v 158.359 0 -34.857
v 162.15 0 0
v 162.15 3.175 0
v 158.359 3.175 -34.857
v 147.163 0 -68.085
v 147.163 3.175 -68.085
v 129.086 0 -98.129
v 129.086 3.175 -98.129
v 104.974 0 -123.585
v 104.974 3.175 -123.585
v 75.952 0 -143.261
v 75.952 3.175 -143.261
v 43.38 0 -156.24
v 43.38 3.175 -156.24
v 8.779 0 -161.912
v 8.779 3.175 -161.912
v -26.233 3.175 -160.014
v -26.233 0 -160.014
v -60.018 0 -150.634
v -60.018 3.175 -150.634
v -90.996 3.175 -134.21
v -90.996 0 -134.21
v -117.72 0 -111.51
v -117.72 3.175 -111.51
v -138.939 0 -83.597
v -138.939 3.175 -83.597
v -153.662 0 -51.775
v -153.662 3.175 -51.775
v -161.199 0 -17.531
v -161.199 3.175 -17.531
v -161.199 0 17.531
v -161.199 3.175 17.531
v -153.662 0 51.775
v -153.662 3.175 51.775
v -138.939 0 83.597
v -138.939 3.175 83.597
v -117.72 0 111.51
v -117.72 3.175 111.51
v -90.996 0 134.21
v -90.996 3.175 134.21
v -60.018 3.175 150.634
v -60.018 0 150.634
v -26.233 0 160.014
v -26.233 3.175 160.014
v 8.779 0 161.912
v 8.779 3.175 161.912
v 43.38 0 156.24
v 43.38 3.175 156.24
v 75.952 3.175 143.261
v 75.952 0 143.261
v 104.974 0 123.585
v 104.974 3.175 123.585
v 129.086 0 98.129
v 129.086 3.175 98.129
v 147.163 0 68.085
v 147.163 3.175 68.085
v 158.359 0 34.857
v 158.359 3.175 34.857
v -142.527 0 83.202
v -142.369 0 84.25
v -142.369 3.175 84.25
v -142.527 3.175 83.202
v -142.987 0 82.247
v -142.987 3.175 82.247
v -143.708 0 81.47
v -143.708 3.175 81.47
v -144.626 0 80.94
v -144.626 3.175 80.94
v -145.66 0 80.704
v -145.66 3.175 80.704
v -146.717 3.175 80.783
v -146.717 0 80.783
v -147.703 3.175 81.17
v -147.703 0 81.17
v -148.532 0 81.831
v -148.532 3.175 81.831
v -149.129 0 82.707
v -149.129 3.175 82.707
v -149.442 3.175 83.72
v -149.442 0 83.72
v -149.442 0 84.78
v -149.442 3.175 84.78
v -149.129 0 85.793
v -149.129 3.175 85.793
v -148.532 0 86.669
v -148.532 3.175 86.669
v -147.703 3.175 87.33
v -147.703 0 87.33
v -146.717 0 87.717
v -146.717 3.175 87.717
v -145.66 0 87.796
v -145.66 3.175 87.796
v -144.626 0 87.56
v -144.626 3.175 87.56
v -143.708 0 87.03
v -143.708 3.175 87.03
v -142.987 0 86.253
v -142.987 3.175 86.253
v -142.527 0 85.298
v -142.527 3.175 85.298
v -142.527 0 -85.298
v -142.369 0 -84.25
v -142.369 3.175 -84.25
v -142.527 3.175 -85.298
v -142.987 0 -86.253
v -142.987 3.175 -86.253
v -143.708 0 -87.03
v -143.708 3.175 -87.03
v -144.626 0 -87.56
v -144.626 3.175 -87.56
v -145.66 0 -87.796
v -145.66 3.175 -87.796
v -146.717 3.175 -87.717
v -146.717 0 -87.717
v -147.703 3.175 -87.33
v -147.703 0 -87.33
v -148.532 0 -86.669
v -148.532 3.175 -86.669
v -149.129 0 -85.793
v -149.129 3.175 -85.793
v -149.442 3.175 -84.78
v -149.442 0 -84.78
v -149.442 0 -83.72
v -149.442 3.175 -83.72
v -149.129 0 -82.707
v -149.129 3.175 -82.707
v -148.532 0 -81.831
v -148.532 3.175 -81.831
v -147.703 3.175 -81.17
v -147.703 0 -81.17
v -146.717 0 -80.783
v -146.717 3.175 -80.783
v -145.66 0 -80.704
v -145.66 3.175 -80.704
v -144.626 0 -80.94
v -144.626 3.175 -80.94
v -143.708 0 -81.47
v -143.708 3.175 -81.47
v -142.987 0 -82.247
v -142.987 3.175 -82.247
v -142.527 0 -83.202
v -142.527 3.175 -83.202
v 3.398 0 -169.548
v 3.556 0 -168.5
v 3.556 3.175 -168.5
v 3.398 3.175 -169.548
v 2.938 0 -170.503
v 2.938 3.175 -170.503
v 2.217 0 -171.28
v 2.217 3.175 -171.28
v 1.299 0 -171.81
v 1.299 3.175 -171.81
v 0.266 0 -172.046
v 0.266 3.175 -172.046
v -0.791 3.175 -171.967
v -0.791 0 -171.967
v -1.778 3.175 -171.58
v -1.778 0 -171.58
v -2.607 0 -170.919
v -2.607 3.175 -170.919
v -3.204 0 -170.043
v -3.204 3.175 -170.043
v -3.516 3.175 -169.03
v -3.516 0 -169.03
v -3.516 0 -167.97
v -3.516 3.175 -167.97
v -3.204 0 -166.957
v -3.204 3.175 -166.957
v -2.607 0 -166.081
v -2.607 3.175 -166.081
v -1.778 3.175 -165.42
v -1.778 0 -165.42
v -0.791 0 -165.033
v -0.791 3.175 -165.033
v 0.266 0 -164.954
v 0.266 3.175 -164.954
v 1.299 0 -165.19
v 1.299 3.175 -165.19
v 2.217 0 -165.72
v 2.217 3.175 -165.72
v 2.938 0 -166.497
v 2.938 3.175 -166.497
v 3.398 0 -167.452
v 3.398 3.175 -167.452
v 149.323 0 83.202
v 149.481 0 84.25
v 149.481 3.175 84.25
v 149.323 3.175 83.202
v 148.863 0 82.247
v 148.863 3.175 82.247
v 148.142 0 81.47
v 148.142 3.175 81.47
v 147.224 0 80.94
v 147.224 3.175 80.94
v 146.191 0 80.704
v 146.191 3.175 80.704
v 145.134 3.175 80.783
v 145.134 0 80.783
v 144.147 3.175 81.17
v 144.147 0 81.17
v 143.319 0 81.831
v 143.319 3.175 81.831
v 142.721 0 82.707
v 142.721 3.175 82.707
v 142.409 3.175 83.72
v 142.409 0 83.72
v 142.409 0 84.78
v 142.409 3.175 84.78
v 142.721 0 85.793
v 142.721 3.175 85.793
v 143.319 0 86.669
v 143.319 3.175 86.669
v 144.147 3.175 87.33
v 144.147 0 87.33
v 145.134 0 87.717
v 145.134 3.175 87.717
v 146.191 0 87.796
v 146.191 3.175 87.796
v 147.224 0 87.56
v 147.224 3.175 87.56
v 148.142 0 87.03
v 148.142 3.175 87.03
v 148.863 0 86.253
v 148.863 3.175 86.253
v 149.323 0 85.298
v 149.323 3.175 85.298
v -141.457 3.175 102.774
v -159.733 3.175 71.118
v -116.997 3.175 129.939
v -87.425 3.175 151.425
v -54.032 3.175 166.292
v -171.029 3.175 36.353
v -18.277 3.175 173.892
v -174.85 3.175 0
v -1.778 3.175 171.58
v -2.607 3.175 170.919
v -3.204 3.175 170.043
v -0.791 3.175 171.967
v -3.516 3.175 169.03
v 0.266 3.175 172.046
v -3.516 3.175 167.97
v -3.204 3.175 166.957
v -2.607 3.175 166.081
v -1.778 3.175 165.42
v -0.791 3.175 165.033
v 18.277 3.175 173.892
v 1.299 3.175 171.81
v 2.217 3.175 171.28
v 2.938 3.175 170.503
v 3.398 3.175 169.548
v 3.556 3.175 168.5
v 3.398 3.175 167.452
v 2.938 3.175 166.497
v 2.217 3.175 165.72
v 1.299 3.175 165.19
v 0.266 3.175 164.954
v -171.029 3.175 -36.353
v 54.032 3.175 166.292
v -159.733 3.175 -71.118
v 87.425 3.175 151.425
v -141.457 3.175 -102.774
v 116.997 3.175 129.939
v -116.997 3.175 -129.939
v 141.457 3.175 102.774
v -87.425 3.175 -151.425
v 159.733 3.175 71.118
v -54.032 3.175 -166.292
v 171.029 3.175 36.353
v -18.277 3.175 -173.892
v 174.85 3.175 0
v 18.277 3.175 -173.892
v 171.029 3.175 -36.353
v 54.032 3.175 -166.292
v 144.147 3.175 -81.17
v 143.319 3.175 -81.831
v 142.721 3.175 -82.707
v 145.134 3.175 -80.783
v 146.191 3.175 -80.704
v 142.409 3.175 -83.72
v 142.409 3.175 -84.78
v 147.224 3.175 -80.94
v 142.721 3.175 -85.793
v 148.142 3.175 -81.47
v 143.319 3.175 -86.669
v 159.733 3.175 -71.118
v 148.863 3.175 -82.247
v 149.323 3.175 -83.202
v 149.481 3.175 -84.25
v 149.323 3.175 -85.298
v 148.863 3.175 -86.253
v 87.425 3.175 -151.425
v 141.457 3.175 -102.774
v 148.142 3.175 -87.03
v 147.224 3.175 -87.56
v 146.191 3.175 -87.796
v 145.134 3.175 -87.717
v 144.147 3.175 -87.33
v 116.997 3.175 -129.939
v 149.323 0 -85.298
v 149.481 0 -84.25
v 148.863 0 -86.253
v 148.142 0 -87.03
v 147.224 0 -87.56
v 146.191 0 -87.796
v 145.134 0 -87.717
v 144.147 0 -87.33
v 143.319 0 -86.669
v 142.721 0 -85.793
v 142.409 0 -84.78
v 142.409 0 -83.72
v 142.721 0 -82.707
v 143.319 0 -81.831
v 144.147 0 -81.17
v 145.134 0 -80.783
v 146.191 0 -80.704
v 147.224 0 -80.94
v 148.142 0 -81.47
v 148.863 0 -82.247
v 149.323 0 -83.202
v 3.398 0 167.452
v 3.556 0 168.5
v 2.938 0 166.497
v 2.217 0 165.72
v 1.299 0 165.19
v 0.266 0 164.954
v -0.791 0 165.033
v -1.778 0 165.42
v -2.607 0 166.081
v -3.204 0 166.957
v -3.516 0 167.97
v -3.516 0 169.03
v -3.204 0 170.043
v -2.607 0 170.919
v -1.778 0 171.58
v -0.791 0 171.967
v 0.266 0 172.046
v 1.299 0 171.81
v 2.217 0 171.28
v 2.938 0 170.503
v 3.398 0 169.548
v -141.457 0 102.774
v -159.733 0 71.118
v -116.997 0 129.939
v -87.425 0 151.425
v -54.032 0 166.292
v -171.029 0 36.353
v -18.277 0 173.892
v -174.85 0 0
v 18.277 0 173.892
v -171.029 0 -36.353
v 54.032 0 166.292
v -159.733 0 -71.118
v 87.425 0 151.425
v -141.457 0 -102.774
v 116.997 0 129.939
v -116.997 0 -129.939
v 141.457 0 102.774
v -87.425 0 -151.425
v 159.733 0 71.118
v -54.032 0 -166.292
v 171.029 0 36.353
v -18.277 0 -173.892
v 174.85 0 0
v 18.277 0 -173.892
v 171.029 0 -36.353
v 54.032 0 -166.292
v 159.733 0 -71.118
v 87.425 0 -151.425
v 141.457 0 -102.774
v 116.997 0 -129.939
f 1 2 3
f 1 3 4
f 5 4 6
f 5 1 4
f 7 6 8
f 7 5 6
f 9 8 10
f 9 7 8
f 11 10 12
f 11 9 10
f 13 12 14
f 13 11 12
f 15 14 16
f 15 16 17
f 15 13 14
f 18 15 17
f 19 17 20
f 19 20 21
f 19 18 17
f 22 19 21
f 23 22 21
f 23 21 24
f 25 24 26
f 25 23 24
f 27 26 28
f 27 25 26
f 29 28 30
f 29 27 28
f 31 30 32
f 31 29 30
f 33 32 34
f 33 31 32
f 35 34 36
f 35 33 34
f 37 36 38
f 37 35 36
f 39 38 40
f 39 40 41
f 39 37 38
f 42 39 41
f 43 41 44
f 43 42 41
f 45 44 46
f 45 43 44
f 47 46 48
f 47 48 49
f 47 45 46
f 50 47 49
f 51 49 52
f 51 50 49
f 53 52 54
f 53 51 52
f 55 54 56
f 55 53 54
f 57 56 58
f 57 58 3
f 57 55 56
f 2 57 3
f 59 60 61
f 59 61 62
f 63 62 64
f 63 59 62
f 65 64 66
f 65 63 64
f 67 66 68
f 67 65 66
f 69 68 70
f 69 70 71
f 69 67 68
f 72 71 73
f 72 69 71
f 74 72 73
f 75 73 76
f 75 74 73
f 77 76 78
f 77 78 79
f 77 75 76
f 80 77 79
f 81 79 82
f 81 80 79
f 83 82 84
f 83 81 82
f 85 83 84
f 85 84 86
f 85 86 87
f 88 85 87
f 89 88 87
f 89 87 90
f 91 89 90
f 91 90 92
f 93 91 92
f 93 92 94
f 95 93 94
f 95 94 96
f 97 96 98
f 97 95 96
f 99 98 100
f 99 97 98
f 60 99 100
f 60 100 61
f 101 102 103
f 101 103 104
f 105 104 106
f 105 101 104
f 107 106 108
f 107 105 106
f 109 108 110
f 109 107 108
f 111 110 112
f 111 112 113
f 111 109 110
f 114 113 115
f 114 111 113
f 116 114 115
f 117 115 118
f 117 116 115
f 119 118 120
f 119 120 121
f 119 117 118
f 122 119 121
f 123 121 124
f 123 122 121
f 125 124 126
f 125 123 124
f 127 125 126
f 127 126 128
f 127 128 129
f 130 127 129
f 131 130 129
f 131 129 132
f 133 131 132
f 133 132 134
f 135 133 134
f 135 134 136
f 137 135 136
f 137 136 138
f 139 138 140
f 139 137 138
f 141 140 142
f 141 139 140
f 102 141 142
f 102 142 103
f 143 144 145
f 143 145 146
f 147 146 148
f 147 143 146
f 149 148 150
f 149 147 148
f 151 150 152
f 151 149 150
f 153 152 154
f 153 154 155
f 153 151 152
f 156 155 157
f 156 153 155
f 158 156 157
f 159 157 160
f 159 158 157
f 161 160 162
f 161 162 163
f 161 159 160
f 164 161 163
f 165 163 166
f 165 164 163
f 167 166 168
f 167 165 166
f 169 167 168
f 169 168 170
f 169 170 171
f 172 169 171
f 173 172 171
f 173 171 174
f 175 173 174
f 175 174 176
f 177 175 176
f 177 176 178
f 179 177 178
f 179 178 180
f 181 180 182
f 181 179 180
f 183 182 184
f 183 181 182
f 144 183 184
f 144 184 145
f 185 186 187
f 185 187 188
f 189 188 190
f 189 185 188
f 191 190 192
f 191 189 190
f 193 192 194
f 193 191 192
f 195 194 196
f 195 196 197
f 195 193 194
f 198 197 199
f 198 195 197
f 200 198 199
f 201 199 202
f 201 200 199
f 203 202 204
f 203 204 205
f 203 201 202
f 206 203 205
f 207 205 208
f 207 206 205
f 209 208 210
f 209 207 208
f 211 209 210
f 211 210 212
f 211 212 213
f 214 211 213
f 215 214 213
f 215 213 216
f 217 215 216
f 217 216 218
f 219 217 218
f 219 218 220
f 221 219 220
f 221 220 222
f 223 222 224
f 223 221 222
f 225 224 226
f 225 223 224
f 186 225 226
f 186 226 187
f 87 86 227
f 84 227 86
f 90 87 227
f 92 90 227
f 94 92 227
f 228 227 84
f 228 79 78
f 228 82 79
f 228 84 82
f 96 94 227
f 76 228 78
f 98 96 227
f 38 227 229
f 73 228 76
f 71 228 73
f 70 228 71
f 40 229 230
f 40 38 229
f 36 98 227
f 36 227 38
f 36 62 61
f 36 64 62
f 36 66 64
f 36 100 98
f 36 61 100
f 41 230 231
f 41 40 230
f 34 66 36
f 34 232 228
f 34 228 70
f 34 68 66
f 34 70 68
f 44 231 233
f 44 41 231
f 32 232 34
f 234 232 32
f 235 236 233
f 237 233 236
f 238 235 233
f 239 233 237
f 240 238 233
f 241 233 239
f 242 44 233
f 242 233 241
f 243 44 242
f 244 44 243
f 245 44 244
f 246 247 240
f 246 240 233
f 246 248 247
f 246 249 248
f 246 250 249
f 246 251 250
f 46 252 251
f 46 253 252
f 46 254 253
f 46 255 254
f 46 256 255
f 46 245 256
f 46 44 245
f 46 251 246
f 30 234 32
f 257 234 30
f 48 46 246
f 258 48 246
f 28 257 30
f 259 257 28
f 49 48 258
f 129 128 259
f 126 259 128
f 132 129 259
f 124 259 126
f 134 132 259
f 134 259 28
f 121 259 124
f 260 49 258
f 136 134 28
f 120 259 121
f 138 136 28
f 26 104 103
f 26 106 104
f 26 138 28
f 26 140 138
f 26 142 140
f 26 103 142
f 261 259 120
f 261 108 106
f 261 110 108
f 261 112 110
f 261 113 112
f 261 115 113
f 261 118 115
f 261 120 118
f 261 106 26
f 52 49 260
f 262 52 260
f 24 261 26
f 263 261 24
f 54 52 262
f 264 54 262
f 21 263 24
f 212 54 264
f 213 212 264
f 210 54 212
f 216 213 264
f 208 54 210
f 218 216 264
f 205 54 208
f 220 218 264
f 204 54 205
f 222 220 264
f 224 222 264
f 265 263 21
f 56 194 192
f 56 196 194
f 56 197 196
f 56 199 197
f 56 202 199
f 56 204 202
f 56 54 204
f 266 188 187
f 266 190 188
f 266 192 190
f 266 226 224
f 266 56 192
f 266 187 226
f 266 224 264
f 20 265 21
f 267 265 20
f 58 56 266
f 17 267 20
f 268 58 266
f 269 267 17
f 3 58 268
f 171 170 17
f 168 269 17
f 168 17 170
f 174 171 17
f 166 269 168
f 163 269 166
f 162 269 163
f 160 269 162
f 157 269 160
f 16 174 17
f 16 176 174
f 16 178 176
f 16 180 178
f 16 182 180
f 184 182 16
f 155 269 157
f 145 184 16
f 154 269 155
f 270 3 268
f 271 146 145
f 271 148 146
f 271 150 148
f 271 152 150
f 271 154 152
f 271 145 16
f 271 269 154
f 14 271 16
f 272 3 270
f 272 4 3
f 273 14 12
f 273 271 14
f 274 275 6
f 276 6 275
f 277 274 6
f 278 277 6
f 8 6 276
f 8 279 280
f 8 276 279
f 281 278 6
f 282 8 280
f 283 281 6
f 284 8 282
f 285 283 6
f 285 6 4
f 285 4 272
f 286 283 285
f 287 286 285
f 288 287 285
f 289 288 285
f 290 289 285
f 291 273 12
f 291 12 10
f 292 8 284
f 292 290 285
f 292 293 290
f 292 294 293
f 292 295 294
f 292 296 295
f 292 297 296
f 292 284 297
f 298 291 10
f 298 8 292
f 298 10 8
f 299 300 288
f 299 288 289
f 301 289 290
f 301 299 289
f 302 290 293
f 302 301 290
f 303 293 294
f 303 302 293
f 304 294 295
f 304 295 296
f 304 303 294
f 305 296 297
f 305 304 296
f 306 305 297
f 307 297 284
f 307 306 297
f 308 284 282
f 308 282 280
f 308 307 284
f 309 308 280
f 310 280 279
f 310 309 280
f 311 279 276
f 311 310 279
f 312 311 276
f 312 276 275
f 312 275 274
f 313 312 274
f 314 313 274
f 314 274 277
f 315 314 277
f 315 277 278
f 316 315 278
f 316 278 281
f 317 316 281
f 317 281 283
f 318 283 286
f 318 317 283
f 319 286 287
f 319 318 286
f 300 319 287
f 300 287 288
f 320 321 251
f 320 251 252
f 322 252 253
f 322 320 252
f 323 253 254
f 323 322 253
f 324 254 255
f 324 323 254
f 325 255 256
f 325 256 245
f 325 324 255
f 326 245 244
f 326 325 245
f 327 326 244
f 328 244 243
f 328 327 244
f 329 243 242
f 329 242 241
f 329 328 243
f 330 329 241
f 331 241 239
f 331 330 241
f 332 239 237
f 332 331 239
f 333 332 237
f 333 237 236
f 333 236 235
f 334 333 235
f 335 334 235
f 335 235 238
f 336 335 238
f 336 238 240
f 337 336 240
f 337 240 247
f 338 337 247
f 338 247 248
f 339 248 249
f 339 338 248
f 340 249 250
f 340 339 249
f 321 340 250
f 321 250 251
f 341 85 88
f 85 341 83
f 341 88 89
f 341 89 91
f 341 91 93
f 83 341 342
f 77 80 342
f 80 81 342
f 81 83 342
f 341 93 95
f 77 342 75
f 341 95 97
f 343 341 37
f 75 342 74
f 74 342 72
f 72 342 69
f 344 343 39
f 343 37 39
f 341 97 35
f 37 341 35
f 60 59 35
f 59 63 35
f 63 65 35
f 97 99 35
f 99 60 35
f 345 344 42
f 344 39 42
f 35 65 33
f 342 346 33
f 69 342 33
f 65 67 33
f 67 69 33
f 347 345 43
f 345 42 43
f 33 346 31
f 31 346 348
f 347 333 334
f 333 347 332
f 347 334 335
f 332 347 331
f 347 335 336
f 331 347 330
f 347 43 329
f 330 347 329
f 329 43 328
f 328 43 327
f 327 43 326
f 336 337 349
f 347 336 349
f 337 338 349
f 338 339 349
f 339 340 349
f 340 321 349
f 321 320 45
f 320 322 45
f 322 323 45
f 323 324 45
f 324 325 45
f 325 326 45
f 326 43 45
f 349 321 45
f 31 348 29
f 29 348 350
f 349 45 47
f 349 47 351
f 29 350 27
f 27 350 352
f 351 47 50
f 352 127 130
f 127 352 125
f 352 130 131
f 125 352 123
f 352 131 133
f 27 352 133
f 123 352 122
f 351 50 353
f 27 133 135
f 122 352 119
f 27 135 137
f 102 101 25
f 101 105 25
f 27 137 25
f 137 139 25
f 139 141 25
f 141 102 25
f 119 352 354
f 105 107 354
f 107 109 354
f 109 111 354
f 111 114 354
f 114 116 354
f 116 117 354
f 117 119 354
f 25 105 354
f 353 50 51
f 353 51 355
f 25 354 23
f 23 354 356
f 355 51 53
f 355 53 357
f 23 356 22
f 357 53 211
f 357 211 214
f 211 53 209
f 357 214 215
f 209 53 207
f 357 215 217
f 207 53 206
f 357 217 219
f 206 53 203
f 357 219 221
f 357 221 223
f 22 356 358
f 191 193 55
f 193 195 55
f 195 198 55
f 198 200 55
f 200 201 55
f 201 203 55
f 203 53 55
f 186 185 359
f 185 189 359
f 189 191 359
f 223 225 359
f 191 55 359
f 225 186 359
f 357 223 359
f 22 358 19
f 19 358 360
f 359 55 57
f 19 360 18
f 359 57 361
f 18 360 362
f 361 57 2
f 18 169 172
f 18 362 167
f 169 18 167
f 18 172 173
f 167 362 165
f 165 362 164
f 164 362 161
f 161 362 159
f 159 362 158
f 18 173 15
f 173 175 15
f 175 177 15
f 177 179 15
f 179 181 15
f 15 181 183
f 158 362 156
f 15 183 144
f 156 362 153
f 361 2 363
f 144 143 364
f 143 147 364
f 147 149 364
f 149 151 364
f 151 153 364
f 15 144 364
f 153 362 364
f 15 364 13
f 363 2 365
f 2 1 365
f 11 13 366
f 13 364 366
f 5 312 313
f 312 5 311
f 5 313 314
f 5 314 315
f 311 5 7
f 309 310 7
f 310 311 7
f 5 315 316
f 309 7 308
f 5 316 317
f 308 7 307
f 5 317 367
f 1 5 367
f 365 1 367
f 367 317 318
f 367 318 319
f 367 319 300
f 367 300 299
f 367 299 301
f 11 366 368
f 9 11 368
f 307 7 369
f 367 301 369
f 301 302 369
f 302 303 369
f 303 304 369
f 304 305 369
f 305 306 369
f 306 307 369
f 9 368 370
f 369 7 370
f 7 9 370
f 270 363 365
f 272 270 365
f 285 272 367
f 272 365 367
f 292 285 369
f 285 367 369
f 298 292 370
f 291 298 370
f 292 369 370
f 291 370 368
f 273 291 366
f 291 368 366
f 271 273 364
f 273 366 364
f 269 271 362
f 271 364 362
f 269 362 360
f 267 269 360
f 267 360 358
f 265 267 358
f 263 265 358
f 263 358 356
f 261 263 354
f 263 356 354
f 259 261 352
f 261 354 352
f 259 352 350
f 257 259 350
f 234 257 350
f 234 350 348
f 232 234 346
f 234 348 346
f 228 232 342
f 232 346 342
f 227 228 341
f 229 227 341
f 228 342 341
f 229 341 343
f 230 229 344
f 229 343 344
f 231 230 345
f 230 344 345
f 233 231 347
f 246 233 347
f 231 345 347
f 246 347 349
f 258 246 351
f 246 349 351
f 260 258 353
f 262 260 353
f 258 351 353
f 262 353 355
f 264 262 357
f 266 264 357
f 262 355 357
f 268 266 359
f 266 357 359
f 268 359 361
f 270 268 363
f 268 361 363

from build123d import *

# Parameters (mm, degrees)
SKETCH1_R           = 174.85
SKETCH1_R_2         = 3.556
SKETCH1_R_3         = 162.15
BOSS_EXTRUDE1_DEPTH = 3.175


with BuildPart() as part:
    # Sketch1 → Boss-Extrude1 (new body)
    with BuildSketch(Plane(origin=(0, 0, 0), x_dir=(1, 0, 0), z_dir=(0, 1, 0))):
        Circle(SKETCH1_R)
        with Locations((0, 168.5)):
            Circle(SKETCH1_R_2, mode=Mode.SUBTRACT)
        with Locations((145.925280538, 84.25)):
            Circle(SKETCH1_R_2, mode=Mode.SUBTRACT)
        with Locations((145.925280538, -84.25)):
            Circle(SKETCH1_R_2, mode=Mode.SUBTRACT)
        with Locations((0, -168.5)):
            Circle(SKETCH1_R_2, mode=Mode.SUBTRACT)
        with Locations((-145.925280538, -84.25)):
            Circle(SKETCH1_R_2, mode=Mode.SUBTRACT)
        with Locations((-145.925280538, 84.25)):
            Circle(SKETCH1_R_2, mode=Mode.SUBTRACT)
        Circle(SKETCH1_R_3, mode=Mode.SUBTRACT)
    extrude(amount=BOSS_EXTRUDE1_DEPTH)


solid = part.part
